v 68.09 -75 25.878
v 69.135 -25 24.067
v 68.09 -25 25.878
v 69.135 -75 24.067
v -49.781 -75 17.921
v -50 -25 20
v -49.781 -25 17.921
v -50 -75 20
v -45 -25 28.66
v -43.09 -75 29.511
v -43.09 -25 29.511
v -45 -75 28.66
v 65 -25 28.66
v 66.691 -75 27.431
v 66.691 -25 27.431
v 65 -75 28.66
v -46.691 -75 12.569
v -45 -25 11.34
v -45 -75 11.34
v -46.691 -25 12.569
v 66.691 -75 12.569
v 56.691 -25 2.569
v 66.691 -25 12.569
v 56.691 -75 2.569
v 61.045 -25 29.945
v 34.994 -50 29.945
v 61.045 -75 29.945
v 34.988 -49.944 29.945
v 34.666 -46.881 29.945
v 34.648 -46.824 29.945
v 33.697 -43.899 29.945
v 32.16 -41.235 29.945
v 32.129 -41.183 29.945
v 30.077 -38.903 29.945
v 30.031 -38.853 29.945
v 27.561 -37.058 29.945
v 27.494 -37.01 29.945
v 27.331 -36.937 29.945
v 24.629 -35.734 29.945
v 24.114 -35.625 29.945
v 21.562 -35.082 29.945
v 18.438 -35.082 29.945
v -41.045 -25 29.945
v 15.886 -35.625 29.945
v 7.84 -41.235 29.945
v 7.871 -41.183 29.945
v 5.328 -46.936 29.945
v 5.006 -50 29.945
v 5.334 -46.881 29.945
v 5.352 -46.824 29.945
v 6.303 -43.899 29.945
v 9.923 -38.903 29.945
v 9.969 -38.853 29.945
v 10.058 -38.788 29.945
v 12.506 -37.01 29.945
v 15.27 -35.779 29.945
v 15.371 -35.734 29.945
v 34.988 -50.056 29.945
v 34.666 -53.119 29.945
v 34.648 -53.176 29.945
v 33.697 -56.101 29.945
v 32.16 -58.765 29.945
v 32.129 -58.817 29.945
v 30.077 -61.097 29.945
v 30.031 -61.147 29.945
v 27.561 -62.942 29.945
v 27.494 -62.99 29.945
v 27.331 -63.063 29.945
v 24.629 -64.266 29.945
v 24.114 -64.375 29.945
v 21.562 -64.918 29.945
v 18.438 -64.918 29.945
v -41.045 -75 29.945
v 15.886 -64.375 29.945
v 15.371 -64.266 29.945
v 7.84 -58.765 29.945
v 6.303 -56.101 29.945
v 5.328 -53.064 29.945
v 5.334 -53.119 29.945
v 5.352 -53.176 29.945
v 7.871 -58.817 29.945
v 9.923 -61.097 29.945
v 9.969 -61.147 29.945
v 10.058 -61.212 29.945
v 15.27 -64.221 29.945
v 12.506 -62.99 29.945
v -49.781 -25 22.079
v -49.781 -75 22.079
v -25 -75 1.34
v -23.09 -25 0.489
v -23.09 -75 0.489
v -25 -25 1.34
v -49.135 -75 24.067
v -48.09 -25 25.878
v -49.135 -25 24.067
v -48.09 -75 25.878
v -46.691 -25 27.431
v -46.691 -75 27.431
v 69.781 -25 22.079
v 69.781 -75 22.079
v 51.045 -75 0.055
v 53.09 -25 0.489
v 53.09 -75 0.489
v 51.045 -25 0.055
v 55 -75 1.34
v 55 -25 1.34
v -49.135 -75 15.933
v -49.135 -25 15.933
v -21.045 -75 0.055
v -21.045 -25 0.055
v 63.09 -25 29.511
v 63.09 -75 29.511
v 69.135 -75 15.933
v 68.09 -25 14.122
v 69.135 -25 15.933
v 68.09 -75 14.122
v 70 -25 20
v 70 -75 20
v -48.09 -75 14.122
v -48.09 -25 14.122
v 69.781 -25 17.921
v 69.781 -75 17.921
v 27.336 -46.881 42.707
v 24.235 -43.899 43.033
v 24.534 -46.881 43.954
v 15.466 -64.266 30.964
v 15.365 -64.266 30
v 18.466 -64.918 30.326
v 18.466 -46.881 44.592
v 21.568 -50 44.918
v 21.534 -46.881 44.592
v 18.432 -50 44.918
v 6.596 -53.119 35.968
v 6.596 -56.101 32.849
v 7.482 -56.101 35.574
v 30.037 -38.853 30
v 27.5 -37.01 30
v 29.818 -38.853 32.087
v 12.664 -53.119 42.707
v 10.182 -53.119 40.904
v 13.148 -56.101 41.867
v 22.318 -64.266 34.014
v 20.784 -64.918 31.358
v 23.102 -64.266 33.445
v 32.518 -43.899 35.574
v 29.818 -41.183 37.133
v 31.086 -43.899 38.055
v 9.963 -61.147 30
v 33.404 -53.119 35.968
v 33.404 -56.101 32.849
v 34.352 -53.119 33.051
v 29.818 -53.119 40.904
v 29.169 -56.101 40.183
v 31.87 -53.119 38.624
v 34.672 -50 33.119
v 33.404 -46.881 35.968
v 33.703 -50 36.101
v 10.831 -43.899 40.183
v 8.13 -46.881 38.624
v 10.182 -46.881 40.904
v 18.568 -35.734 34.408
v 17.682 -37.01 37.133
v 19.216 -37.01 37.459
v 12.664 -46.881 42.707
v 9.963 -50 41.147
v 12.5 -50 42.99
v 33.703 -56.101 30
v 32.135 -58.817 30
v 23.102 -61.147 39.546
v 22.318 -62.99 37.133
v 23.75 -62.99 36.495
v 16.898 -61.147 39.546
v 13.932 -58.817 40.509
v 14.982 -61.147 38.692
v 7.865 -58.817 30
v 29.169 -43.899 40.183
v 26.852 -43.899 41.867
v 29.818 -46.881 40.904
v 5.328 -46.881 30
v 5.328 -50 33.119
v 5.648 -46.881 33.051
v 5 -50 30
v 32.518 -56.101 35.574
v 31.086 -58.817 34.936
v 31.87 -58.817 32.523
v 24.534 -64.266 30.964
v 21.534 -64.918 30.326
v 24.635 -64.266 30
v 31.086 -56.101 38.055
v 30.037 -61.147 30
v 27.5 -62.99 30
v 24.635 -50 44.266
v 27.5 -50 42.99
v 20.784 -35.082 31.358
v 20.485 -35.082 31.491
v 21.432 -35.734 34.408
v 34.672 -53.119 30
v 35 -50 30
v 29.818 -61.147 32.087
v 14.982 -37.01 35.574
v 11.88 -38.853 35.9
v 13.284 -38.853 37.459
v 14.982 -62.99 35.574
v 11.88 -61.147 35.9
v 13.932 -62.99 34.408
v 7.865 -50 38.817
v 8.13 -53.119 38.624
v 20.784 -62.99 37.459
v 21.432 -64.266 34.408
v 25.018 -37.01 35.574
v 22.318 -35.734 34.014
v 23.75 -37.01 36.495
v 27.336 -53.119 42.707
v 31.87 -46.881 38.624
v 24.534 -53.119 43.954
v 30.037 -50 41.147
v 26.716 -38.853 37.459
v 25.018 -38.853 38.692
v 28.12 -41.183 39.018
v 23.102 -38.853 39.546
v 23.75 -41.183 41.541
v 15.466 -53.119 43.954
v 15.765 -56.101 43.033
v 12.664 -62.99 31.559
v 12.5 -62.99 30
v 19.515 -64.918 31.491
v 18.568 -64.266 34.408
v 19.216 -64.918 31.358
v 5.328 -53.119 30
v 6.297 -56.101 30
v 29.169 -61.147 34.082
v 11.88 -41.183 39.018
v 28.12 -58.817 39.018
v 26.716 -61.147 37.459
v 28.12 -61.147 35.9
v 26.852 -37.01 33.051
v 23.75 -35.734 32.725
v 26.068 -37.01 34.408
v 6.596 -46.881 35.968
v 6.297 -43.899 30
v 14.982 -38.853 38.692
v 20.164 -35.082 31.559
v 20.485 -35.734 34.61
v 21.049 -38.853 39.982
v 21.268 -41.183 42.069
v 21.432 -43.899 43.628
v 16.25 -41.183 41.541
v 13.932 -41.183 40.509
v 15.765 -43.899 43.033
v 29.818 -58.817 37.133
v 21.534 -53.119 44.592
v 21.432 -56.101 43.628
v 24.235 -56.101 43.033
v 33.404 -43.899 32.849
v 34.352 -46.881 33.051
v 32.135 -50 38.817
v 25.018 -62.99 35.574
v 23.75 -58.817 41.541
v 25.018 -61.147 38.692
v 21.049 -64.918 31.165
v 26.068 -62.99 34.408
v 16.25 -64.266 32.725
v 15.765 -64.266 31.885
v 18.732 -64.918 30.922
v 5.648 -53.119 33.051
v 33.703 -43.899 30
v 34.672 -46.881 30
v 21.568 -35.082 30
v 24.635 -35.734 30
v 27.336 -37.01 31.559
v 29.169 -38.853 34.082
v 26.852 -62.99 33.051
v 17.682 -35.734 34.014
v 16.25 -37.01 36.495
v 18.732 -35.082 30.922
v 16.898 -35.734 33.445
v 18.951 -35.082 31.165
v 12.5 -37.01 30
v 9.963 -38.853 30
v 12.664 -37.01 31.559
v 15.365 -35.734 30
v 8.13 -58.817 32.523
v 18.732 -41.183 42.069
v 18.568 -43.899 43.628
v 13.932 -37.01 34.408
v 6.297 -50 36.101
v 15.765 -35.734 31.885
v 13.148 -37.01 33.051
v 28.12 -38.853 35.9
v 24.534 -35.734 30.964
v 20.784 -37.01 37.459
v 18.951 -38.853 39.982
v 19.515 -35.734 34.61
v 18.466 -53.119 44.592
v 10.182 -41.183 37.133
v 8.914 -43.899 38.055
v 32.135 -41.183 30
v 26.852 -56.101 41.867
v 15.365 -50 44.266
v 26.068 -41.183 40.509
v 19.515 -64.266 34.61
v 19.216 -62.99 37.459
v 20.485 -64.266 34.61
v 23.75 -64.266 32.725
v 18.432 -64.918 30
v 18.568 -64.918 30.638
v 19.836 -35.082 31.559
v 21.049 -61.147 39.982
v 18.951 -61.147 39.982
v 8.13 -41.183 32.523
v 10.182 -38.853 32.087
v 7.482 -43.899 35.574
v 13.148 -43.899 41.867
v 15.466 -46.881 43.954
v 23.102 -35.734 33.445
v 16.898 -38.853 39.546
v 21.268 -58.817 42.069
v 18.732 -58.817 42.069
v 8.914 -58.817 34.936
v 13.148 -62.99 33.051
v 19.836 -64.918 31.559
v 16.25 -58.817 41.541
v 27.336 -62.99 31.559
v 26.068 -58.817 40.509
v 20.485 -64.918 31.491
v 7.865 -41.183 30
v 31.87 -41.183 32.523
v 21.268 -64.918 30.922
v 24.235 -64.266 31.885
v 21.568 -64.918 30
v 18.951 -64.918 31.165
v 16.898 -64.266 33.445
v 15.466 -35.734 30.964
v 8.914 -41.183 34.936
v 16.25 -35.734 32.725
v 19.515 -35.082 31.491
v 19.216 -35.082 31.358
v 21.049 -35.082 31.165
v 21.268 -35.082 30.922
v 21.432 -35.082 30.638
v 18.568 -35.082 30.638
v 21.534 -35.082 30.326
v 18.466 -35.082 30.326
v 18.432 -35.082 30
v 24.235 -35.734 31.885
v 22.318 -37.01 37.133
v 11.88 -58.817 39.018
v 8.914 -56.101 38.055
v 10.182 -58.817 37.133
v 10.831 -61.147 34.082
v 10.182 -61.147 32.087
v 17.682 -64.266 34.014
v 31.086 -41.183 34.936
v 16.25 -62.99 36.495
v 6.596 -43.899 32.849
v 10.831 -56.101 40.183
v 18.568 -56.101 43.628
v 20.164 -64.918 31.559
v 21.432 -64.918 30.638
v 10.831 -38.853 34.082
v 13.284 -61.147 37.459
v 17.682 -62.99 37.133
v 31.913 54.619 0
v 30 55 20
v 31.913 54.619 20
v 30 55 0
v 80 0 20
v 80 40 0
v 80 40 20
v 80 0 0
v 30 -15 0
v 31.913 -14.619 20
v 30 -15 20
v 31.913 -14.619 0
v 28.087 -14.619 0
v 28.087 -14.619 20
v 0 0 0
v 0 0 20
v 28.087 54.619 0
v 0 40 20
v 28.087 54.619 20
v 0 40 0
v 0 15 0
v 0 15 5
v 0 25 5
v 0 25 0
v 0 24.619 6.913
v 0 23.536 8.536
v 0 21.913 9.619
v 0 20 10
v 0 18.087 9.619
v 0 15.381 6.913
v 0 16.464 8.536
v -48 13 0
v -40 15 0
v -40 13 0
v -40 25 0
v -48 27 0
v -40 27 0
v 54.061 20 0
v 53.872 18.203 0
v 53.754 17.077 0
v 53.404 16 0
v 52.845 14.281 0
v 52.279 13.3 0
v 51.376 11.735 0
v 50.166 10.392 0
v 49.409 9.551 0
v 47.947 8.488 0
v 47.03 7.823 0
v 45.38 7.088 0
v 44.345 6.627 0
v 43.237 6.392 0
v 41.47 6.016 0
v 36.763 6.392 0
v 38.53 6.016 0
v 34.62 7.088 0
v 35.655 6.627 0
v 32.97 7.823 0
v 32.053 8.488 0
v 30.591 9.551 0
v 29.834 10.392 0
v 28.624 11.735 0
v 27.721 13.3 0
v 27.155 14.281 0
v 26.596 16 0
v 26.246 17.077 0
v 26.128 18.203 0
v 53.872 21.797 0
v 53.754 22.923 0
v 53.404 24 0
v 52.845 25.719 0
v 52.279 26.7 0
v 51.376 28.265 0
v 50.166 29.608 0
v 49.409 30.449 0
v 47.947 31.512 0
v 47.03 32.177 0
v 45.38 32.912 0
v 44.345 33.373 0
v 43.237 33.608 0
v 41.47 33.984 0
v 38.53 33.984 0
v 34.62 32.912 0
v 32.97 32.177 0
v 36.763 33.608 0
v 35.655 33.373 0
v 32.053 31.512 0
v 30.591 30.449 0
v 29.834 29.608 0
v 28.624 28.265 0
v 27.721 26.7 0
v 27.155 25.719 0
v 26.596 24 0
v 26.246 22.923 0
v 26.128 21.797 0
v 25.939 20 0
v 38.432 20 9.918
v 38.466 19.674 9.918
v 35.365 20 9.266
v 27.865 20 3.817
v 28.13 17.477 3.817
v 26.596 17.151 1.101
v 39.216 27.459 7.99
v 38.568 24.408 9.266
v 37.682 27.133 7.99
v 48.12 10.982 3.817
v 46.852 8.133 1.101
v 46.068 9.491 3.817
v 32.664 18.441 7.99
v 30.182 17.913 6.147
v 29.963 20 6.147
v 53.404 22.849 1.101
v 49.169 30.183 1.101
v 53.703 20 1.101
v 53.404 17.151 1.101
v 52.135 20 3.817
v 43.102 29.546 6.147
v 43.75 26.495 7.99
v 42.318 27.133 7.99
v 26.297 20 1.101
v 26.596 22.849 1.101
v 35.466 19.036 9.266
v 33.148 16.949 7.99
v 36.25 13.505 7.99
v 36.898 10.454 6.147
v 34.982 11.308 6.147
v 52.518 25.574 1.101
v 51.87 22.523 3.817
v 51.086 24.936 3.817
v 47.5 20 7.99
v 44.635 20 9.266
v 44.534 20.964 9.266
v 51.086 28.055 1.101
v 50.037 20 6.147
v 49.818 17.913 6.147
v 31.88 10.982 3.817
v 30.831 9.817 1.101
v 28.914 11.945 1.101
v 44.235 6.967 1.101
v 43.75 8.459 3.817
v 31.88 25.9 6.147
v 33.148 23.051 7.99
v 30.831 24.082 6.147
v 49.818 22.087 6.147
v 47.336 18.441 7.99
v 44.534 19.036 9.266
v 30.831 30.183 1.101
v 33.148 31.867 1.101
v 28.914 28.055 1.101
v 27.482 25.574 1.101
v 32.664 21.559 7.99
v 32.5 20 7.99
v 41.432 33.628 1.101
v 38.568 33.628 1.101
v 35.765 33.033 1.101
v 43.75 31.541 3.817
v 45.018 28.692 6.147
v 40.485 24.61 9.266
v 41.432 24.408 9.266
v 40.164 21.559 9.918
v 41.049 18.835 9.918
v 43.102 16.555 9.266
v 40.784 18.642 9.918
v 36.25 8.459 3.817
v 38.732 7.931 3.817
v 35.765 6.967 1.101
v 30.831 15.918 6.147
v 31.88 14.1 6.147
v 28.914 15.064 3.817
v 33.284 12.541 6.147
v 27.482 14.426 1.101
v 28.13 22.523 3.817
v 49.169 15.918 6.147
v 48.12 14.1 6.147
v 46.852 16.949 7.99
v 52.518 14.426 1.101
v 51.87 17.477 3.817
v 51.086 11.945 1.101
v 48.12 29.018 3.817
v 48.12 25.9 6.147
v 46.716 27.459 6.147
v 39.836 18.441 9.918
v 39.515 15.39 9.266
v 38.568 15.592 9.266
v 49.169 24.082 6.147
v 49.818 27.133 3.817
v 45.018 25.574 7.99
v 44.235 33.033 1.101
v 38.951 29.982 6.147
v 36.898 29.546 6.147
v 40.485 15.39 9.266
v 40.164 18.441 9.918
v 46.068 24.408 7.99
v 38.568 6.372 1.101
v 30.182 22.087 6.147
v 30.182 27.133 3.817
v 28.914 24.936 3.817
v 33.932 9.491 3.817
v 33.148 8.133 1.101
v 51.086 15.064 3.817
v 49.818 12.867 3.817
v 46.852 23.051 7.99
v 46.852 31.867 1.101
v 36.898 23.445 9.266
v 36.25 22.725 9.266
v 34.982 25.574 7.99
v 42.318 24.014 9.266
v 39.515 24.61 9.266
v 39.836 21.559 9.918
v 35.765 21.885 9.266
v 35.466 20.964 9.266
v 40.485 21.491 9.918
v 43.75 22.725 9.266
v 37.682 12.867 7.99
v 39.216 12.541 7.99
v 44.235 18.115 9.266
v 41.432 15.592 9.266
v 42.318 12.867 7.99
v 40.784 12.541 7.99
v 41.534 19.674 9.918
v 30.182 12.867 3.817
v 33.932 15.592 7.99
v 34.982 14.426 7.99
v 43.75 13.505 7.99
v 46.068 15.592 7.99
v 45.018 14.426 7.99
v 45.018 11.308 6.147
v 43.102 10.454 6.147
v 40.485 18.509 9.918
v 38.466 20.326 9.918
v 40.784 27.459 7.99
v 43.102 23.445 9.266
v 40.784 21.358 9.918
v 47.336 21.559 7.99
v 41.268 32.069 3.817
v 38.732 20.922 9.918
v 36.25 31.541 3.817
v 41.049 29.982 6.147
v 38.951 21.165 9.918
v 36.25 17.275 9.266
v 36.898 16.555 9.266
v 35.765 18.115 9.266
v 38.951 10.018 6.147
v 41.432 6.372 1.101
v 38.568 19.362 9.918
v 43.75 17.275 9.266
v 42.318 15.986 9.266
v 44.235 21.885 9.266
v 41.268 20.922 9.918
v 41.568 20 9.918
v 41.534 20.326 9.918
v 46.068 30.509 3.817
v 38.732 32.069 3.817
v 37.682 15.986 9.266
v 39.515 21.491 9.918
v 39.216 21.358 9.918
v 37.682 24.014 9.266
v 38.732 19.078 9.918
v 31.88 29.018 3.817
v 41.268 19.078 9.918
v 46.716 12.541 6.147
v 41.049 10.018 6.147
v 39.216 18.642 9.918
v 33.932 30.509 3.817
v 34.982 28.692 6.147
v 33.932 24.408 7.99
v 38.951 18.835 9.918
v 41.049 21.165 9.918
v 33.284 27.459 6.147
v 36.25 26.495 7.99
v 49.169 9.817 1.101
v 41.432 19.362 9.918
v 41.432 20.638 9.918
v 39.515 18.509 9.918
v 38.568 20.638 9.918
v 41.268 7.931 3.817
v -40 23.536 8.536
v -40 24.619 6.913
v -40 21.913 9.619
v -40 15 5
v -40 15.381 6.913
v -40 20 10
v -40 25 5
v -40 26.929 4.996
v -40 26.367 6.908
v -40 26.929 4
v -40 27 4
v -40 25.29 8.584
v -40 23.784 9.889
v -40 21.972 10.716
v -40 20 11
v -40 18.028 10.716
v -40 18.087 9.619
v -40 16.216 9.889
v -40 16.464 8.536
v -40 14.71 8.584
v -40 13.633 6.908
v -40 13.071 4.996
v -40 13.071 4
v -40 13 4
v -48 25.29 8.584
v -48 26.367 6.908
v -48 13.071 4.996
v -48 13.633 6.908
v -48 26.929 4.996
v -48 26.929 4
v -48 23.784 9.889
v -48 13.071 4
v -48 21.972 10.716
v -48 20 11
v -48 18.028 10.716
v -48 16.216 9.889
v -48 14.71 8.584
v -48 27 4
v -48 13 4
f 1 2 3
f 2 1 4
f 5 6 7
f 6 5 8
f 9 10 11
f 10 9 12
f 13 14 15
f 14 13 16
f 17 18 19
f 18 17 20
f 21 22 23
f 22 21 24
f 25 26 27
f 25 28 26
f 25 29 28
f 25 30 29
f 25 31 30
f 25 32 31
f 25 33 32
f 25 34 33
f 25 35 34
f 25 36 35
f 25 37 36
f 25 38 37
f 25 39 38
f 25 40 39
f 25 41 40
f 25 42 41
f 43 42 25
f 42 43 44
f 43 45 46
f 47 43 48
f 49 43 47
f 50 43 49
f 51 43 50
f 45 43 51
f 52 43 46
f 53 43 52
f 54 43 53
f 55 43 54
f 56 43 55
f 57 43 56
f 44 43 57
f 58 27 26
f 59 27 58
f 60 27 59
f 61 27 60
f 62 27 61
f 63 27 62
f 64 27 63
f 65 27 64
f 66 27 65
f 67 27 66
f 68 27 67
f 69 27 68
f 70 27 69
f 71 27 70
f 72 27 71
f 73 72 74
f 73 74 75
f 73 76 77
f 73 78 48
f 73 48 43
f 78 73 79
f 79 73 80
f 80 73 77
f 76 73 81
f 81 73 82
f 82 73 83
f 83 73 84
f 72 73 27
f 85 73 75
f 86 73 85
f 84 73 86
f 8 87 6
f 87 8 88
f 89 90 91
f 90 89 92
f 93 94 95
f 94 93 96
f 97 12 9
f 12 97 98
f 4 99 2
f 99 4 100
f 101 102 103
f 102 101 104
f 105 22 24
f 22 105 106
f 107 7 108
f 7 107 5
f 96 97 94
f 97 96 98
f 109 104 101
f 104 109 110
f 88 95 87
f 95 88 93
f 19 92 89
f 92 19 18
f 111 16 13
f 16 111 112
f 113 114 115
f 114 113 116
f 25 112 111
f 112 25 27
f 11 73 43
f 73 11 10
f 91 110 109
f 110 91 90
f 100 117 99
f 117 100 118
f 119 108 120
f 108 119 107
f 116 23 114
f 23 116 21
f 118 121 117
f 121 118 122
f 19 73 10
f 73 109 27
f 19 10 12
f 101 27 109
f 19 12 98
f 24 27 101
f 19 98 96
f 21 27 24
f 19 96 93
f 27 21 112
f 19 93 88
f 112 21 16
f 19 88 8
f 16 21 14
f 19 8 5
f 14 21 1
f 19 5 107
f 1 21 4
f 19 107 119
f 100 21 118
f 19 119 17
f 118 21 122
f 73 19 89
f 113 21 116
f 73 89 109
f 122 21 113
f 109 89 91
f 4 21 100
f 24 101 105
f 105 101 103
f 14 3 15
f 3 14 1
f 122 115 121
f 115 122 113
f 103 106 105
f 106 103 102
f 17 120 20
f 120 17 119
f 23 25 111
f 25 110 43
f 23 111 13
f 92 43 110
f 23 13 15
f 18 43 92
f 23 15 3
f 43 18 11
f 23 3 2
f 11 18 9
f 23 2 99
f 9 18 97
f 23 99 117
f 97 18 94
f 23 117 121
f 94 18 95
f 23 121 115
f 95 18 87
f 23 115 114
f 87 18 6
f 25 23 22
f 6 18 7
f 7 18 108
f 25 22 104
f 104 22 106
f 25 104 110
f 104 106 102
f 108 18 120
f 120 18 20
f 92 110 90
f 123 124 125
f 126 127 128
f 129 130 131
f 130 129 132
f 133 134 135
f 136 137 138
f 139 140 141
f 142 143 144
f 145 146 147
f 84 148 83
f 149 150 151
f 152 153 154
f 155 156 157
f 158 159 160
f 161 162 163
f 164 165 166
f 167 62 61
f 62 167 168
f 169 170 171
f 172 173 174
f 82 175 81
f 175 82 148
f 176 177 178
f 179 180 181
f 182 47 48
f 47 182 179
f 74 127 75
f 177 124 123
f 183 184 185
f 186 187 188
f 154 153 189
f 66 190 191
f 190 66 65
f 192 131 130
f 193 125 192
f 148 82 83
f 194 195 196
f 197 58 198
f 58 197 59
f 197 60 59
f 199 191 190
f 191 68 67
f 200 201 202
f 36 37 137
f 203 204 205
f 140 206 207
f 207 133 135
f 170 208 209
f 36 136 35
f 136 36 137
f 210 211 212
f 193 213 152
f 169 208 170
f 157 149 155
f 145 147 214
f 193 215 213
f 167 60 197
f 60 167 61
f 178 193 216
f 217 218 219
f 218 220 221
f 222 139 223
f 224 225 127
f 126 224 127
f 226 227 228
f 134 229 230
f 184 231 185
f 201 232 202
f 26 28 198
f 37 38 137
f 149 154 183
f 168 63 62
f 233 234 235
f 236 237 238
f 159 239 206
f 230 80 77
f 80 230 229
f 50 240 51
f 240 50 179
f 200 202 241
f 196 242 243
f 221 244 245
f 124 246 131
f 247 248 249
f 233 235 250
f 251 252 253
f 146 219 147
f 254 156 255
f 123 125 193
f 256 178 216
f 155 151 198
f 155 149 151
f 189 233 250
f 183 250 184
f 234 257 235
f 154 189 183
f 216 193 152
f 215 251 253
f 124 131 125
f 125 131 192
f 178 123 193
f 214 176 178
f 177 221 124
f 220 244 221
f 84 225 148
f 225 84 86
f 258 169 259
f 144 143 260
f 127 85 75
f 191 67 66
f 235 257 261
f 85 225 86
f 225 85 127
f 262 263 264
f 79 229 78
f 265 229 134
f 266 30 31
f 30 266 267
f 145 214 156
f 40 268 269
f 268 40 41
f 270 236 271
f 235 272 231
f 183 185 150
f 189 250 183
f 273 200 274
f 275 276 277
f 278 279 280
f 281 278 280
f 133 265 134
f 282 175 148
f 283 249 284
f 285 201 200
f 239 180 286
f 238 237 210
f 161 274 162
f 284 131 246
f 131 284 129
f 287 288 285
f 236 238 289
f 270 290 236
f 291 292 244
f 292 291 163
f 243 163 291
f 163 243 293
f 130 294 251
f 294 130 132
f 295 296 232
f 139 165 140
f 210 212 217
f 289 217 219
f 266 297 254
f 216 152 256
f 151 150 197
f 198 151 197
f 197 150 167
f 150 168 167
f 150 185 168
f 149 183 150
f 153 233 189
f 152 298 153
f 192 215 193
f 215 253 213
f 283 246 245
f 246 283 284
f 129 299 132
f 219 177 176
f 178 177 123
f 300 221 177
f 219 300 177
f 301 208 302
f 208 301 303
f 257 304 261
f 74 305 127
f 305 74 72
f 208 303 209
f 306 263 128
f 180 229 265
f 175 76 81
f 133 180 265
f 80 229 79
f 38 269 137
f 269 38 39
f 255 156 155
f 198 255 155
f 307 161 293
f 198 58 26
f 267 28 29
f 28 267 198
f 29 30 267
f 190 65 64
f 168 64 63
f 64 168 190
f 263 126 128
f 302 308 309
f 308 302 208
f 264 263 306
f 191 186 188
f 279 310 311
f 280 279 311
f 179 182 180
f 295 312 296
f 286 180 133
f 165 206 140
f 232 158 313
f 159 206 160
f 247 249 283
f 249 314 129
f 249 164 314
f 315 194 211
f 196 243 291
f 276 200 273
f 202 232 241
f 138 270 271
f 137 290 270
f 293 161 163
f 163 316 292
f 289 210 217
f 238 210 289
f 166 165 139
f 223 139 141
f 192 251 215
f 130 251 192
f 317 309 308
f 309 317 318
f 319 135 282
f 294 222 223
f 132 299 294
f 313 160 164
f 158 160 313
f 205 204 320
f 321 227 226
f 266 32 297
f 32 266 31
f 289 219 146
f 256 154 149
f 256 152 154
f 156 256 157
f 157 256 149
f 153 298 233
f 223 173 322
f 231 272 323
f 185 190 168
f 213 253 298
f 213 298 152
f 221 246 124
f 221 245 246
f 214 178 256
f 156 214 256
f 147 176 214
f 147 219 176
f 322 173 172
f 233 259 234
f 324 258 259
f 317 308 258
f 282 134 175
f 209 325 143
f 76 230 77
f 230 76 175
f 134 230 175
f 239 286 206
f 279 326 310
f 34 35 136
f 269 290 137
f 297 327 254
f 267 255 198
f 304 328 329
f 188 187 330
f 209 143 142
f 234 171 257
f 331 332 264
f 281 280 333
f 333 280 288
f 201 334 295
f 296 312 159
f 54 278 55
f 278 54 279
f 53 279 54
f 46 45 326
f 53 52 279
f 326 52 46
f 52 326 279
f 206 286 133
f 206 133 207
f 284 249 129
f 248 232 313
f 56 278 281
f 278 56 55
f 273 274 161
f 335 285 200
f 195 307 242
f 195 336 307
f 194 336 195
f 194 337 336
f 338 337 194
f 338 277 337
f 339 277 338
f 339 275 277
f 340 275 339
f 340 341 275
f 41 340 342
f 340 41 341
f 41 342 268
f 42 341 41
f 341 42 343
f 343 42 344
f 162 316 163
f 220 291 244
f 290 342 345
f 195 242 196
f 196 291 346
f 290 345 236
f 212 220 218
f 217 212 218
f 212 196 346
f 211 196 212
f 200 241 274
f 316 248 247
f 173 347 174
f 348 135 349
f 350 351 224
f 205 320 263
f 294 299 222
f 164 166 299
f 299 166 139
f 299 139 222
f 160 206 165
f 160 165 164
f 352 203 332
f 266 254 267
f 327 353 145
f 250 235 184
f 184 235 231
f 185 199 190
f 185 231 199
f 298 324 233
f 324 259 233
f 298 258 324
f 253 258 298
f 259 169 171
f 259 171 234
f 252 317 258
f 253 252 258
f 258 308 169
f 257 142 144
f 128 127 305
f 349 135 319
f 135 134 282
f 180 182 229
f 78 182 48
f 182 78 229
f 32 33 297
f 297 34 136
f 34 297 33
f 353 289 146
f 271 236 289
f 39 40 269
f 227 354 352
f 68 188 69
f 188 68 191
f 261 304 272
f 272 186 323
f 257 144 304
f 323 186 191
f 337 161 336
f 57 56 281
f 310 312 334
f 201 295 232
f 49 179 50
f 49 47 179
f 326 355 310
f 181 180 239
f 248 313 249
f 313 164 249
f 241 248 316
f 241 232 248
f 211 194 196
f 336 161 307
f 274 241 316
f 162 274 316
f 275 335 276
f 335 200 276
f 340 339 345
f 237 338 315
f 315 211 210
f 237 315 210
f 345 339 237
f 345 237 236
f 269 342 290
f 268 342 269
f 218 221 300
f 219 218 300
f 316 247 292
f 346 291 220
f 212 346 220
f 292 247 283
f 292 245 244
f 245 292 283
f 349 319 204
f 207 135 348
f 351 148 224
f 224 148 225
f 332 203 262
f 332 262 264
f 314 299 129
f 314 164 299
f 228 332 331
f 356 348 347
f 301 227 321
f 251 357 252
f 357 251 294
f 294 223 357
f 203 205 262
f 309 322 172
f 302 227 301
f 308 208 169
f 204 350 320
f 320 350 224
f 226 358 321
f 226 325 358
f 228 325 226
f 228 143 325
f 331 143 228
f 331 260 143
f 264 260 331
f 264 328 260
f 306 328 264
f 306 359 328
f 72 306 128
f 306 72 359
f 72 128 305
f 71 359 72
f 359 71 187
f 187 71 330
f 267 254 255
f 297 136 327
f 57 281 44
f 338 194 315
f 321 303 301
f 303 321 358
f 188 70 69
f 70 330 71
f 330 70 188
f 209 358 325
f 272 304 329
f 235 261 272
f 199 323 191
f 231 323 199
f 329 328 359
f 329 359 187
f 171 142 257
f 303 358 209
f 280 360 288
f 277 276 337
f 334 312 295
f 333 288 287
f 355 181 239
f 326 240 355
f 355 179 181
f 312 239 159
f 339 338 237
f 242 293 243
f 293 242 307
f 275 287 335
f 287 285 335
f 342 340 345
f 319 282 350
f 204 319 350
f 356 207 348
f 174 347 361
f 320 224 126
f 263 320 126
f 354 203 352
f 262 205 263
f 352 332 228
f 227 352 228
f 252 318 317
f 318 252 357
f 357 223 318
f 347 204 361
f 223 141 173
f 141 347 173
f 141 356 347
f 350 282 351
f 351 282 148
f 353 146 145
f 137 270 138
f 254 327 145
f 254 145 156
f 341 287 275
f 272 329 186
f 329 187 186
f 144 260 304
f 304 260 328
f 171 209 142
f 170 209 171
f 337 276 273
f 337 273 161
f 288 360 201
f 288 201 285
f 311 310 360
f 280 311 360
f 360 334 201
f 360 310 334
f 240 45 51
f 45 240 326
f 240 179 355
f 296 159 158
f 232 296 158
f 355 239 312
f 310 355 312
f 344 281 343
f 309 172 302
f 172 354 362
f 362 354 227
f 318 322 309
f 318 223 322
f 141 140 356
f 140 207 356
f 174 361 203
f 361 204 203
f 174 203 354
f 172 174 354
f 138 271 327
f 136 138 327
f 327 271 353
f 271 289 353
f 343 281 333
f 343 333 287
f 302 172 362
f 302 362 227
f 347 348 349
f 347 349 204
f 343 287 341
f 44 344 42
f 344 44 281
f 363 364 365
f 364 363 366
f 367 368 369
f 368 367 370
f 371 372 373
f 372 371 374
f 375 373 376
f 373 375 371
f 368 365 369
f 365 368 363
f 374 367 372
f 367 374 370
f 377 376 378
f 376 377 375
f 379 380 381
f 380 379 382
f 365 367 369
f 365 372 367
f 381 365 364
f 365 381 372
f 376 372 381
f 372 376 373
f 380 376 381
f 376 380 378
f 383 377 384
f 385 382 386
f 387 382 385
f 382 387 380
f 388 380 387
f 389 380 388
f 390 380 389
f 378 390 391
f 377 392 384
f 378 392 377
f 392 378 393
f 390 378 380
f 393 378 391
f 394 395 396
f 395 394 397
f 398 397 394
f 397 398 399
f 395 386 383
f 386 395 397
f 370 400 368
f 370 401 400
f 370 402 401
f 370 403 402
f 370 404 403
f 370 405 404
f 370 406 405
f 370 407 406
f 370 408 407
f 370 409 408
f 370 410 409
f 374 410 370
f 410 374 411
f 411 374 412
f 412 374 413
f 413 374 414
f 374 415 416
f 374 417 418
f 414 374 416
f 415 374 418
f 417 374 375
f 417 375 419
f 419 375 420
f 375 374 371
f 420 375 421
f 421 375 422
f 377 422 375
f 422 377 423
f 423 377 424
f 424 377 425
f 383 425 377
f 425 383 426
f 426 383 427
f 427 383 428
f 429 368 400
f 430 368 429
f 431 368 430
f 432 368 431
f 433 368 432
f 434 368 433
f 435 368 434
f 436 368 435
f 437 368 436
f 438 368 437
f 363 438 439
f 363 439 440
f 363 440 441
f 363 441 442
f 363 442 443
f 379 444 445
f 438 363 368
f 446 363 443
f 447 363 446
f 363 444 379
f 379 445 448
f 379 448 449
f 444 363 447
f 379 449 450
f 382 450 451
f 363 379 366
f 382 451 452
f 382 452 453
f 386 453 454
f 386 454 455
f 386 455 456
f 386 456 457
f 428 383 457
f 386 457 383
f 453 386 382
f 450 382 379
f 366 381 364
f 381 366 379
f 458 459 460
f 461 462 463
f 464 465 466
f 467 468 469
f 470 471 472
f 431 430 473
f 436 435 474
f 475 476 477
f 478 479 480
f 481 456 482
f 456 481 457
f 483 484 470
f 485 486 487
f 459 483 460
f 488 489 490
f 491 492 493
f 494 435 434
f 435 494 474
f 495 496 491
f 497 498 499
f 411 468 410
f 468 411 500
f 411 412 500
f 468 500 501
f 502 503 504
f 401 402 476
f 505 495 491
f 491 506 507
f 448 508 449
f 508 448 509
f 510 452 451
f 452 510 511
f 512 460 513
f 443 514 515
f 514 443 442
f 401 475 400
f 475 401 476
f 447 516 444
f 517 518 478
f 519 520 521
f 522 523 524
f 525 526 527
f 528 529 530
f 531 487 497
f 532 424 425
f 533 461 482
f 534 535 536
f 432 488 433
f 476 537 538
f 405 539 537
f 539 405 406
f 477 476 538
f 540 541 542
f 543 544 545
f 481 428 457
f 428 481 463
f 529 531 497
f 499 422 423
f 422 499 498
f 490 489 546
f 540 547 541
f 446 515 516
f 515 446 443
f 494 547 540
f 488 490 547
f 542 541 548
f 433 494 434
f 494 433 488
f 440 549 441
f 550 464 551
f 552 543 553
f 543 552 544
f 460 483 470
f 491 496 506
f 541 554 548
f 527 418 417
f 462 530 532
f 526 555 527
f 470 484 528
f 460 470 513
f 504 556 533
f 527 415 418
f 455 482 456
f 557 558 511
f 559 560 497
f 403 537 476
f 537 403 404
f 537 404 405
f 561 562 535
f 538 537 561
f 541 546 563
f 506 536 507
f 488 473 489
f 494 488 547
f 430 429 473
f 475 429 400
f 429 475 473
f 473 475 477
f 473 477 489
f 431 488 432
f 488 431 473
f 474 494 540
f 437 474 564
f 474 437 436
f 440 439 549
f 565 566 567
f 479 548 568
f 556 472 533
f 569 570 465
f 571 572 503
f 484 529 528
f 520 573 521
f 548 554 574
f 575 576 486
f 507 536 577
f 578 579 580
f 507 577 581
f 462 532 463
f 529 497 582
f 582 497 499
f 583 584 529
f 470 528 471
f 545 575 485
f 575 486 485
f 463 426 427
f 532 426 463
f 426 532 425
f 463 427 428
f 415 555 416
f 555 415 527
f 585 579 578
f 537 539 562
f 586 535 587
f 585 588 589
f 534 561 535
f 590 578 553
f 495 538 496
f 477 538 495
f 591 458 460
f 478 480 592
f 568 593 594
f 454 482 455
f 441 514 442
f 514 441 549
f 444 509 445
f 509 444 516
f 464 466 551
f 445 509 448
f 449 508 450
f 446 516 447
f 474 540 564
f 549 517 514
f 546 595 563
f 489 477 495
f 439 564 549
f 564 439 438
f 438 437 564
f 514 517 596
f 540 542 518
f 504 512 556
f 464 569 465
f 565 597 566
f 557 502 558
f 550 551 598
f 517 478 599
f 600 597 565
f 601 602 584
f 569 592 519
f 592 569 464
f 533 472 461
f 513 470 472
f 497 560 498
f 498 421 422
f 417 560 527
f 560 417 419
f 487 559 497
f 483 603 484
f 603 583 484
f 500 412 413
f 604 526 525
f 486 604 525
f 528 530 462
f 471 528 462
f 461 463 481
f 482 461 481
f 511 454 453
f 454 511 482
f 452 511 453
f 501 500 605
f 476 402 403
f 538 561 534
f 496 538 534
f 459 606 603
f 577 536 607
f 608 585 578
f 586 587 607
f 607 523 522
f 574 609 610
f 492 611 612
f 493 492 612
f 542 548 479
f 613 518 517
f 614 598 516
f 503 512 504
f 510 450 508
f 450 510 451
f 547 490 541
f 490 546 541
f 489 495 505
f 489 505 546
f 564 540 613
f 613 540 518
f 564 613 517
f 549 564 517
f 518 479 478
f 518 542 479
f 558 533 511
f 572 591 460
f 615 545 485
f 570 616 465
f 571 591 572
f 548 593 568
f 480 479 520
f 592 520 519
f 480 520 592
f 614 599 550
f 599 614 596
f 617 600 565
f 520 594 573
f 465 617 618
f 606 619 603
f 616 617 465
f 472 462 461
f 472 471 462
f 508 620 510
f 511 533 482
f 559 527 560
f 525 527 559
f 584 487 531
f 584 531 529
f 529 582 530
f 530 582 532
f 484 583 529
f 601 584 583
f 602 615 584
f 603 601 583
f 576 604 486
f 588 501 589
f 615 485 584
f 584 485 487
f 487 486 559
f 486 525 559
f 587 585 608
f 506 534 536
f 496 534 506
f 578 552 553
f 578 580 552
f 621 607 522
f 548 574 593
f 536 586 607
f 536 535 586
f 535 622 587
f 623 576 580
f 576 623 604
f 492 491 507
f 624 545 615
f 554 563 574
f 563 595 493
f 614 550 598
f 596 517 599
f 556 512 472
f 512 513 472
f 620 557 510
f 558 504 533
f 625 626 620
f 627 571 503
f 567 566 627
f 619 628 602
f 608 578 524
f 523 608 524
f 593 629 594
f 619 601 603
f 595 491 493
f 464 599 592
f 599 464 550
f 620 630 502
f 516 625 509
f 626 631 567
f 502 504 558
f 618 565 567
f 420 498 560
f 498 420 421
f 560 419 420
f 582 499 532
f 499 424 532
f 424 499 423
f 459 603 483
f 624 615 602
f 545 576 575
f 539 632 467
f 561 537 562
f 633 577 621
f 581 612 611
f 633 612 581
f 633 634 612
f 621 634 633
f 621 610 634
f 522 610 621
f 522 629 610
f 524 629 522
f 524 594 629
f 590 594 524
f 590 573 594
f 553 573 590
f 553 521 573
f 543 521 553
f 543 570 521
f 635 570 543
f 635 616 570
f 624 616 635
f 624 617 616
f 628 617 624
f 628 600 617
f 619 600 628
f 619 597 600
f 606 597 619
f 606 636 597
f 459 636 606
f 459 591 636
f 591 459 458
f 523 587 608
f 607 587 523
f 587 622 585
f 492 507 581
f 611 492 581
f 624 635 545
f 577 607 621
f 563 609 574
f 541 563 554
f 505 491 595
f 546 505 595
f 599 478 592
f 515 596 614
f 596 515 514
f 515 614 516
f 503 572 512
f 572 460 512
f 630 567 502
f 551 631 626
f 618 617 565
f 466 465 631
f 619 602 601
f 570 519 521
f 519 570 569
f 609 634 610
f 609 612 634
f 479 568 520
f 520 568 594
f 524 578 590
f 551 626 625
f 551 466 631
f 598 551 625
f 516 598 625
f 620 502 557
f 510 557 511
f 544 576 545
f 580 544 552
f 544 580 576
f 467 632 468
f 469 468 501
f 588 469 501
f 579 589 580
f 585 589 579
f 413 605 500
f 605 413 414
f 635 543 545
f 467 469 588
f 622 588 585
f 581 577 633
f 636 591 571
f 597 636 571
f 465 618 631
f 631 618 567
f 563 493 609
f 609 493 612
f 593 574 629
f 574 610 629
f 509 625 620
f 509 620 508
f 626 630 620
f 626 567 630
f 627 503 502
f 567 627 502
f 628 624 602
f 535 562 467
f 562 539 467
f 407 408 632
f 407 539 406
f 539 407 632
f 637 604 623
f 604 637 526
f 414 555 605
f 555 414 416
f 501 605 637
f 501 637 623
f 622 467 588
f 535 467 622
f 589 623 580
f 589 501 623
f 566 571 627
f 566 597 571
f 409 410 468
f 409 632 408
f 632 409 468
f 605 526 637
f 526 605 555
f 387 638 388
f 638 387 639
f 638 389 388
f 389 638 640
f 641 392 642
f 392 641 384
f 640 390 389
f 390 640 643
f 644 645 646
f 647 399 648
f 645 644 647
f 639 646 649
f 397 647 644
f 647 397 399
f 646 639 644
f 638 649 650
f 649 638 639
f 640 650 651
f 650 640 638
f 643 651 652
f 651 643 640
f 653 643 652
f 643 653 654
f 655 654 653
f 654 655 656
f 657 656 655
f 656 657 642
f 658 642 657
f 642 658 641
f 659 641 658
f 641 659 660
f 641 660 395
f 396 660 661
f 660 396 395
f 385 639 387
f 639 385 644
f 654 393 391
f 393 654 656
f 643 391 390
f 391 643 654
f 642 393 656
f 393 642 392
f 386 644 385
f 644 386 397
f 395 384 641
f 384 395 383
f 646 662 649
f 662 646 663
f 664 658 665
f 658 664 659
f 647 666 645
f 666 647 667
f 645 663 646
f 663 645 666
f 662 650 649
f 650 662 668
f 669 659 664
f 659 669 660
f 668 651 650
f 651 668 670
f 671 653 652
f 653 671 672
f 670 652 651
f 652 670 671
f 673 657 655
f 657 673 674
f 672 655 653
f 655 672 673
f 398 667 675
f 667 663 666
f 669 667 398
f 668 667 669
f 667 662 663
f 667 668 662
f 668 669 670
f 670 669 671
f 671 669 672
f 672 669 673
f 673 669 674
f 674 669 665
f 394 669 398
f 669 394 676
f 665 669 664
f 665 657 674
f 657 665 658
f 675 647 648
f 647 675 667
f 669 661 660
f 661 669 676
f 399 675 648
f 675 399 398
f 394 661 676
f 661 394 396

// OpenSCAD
/*hull of vehicle*/
vehicle_breadth = 50;
vehicle_length = 100;
vehicle_height = 10;
wheel_radius = 10; 
bottom_wheel_offset_from_front = 20;
bottom_wheel_offset_from_back = 10;

/*pivot point between body/hull and turret*/ 
pivot_diameter = 30;
pivot_offset_from_vehicle_front = 60; //how far turret is from front
turret_hull_gap =5; //gap between turret and hull


/*gun*/
gun_length=40;
gun_diameter =10;
show_muzzle = 1;//[0:hide, 1:show]
muzzle_diameter=14;
muzzle_length=8;

/*turret*/
turret_length = 80;
turret_narrow_breadth = 40;
turret_wide_breadth = 50;
turret_height = 20;
turret_side_offset_from_front =30; 

turret_side_offset_from_side = turret_wide_breadth -turret_narrow_breadth; 
turret_center_front =  turret_narrow_breadth/2 ;
turret_center_side =  turret_length/2 ;

vehicle_body(); 
turret();
gun();

/*GUN RELATED*/
module gun(){
    
    rotate([ 0,90,0])
    translate([ -gun_diameter/2,turret_center_front,-gun_length]){
        cylinder(d=gun_diameter, h=gun_length);
        translate ([0,-gun_diameter/2,0])
        cube([gun_diameter/2, gun_diameter, gun_length]); 
    }  
     
    if(show_muzzle){ 
        muzzle();
    }
        

    module muzzle(){ 
            
        muzzle_bottom = muzzle_diameter-gun_diameter;
        
        rotate([ 0,90,0])
        translate([ 0,turret_center_front,-(gun_length+muzzle_length)])
        { 
            difference(){
                translate([-(muzzle_bottom),0,0]) 
                cylinder(d=muzzle_diameter, h=muzzle_length); 
                translate([0,-muzzle_diameter/2,0])
                cube ([muzzle_diameter, muzzle_diameter, muzzle_length]);
        } 
        translate([-muzzle_bottom,-muzzle_diameter/2,0])
        cube([muzzle_bottom, muzzle_diameter,muzzle_length]);
           
        }
        
    }
}

/*TURRET RELATED*/
module pivot_turret(){
    translate([turret_center_side, turret_center_front,-turret_hull_gap])
sphere(d=pivot_diameter);
}


module turret(){
    difference(){
        hull(){
        cube( [turret_length, turret_narrow_breadth, turret_height] );

        translate([turret_side_offset_from_front,-turret_side_offset_from_side,0])
        cylinder(d=10, h=turret_height);
            
        translate([turret_side_offset_from_front, turret_side_offset_from_side+ turret_narrow_breadth ,0])
        cylinder(d=10, h=turret_height);

        } 
        
        pivot_turret();
    }
}

/*HULL RELATED*/
module pivot_hull(){ 
translate([pivot_offset_from_vehicle_front, 
     wheel_radius,
     vehicle_breadth/2  ])
        sphere(d=pivot_diameter);
}

module vehicle_body(){ 
    
    module wheel() cylinder(r=wheel_radius, h=vehicle_breadth); 
    vehicle_bottom_front_xy = [ bottom_wheel_offset_from_front, -vehicle_height ]; 
    vehicle_bottom_back_xy = [ vehicle_length - bottom_wheel_offset_from_back, -vehicle_height];
         
    
    rotate([90,0,0])
    translate([-gun_length,vehicle_height+wheel_radius, turret_side_offset_from_side+15 ]){
        hull(){
        wheel();
        translate([vehicle_length,0 ]) wheel();
        translate(vehicle_bottom_front_xy)
        wheel();
        translate(vehicle_bottom_back_xy)
        wheel();
        } 
        
        pivot_hull();
    }
}
